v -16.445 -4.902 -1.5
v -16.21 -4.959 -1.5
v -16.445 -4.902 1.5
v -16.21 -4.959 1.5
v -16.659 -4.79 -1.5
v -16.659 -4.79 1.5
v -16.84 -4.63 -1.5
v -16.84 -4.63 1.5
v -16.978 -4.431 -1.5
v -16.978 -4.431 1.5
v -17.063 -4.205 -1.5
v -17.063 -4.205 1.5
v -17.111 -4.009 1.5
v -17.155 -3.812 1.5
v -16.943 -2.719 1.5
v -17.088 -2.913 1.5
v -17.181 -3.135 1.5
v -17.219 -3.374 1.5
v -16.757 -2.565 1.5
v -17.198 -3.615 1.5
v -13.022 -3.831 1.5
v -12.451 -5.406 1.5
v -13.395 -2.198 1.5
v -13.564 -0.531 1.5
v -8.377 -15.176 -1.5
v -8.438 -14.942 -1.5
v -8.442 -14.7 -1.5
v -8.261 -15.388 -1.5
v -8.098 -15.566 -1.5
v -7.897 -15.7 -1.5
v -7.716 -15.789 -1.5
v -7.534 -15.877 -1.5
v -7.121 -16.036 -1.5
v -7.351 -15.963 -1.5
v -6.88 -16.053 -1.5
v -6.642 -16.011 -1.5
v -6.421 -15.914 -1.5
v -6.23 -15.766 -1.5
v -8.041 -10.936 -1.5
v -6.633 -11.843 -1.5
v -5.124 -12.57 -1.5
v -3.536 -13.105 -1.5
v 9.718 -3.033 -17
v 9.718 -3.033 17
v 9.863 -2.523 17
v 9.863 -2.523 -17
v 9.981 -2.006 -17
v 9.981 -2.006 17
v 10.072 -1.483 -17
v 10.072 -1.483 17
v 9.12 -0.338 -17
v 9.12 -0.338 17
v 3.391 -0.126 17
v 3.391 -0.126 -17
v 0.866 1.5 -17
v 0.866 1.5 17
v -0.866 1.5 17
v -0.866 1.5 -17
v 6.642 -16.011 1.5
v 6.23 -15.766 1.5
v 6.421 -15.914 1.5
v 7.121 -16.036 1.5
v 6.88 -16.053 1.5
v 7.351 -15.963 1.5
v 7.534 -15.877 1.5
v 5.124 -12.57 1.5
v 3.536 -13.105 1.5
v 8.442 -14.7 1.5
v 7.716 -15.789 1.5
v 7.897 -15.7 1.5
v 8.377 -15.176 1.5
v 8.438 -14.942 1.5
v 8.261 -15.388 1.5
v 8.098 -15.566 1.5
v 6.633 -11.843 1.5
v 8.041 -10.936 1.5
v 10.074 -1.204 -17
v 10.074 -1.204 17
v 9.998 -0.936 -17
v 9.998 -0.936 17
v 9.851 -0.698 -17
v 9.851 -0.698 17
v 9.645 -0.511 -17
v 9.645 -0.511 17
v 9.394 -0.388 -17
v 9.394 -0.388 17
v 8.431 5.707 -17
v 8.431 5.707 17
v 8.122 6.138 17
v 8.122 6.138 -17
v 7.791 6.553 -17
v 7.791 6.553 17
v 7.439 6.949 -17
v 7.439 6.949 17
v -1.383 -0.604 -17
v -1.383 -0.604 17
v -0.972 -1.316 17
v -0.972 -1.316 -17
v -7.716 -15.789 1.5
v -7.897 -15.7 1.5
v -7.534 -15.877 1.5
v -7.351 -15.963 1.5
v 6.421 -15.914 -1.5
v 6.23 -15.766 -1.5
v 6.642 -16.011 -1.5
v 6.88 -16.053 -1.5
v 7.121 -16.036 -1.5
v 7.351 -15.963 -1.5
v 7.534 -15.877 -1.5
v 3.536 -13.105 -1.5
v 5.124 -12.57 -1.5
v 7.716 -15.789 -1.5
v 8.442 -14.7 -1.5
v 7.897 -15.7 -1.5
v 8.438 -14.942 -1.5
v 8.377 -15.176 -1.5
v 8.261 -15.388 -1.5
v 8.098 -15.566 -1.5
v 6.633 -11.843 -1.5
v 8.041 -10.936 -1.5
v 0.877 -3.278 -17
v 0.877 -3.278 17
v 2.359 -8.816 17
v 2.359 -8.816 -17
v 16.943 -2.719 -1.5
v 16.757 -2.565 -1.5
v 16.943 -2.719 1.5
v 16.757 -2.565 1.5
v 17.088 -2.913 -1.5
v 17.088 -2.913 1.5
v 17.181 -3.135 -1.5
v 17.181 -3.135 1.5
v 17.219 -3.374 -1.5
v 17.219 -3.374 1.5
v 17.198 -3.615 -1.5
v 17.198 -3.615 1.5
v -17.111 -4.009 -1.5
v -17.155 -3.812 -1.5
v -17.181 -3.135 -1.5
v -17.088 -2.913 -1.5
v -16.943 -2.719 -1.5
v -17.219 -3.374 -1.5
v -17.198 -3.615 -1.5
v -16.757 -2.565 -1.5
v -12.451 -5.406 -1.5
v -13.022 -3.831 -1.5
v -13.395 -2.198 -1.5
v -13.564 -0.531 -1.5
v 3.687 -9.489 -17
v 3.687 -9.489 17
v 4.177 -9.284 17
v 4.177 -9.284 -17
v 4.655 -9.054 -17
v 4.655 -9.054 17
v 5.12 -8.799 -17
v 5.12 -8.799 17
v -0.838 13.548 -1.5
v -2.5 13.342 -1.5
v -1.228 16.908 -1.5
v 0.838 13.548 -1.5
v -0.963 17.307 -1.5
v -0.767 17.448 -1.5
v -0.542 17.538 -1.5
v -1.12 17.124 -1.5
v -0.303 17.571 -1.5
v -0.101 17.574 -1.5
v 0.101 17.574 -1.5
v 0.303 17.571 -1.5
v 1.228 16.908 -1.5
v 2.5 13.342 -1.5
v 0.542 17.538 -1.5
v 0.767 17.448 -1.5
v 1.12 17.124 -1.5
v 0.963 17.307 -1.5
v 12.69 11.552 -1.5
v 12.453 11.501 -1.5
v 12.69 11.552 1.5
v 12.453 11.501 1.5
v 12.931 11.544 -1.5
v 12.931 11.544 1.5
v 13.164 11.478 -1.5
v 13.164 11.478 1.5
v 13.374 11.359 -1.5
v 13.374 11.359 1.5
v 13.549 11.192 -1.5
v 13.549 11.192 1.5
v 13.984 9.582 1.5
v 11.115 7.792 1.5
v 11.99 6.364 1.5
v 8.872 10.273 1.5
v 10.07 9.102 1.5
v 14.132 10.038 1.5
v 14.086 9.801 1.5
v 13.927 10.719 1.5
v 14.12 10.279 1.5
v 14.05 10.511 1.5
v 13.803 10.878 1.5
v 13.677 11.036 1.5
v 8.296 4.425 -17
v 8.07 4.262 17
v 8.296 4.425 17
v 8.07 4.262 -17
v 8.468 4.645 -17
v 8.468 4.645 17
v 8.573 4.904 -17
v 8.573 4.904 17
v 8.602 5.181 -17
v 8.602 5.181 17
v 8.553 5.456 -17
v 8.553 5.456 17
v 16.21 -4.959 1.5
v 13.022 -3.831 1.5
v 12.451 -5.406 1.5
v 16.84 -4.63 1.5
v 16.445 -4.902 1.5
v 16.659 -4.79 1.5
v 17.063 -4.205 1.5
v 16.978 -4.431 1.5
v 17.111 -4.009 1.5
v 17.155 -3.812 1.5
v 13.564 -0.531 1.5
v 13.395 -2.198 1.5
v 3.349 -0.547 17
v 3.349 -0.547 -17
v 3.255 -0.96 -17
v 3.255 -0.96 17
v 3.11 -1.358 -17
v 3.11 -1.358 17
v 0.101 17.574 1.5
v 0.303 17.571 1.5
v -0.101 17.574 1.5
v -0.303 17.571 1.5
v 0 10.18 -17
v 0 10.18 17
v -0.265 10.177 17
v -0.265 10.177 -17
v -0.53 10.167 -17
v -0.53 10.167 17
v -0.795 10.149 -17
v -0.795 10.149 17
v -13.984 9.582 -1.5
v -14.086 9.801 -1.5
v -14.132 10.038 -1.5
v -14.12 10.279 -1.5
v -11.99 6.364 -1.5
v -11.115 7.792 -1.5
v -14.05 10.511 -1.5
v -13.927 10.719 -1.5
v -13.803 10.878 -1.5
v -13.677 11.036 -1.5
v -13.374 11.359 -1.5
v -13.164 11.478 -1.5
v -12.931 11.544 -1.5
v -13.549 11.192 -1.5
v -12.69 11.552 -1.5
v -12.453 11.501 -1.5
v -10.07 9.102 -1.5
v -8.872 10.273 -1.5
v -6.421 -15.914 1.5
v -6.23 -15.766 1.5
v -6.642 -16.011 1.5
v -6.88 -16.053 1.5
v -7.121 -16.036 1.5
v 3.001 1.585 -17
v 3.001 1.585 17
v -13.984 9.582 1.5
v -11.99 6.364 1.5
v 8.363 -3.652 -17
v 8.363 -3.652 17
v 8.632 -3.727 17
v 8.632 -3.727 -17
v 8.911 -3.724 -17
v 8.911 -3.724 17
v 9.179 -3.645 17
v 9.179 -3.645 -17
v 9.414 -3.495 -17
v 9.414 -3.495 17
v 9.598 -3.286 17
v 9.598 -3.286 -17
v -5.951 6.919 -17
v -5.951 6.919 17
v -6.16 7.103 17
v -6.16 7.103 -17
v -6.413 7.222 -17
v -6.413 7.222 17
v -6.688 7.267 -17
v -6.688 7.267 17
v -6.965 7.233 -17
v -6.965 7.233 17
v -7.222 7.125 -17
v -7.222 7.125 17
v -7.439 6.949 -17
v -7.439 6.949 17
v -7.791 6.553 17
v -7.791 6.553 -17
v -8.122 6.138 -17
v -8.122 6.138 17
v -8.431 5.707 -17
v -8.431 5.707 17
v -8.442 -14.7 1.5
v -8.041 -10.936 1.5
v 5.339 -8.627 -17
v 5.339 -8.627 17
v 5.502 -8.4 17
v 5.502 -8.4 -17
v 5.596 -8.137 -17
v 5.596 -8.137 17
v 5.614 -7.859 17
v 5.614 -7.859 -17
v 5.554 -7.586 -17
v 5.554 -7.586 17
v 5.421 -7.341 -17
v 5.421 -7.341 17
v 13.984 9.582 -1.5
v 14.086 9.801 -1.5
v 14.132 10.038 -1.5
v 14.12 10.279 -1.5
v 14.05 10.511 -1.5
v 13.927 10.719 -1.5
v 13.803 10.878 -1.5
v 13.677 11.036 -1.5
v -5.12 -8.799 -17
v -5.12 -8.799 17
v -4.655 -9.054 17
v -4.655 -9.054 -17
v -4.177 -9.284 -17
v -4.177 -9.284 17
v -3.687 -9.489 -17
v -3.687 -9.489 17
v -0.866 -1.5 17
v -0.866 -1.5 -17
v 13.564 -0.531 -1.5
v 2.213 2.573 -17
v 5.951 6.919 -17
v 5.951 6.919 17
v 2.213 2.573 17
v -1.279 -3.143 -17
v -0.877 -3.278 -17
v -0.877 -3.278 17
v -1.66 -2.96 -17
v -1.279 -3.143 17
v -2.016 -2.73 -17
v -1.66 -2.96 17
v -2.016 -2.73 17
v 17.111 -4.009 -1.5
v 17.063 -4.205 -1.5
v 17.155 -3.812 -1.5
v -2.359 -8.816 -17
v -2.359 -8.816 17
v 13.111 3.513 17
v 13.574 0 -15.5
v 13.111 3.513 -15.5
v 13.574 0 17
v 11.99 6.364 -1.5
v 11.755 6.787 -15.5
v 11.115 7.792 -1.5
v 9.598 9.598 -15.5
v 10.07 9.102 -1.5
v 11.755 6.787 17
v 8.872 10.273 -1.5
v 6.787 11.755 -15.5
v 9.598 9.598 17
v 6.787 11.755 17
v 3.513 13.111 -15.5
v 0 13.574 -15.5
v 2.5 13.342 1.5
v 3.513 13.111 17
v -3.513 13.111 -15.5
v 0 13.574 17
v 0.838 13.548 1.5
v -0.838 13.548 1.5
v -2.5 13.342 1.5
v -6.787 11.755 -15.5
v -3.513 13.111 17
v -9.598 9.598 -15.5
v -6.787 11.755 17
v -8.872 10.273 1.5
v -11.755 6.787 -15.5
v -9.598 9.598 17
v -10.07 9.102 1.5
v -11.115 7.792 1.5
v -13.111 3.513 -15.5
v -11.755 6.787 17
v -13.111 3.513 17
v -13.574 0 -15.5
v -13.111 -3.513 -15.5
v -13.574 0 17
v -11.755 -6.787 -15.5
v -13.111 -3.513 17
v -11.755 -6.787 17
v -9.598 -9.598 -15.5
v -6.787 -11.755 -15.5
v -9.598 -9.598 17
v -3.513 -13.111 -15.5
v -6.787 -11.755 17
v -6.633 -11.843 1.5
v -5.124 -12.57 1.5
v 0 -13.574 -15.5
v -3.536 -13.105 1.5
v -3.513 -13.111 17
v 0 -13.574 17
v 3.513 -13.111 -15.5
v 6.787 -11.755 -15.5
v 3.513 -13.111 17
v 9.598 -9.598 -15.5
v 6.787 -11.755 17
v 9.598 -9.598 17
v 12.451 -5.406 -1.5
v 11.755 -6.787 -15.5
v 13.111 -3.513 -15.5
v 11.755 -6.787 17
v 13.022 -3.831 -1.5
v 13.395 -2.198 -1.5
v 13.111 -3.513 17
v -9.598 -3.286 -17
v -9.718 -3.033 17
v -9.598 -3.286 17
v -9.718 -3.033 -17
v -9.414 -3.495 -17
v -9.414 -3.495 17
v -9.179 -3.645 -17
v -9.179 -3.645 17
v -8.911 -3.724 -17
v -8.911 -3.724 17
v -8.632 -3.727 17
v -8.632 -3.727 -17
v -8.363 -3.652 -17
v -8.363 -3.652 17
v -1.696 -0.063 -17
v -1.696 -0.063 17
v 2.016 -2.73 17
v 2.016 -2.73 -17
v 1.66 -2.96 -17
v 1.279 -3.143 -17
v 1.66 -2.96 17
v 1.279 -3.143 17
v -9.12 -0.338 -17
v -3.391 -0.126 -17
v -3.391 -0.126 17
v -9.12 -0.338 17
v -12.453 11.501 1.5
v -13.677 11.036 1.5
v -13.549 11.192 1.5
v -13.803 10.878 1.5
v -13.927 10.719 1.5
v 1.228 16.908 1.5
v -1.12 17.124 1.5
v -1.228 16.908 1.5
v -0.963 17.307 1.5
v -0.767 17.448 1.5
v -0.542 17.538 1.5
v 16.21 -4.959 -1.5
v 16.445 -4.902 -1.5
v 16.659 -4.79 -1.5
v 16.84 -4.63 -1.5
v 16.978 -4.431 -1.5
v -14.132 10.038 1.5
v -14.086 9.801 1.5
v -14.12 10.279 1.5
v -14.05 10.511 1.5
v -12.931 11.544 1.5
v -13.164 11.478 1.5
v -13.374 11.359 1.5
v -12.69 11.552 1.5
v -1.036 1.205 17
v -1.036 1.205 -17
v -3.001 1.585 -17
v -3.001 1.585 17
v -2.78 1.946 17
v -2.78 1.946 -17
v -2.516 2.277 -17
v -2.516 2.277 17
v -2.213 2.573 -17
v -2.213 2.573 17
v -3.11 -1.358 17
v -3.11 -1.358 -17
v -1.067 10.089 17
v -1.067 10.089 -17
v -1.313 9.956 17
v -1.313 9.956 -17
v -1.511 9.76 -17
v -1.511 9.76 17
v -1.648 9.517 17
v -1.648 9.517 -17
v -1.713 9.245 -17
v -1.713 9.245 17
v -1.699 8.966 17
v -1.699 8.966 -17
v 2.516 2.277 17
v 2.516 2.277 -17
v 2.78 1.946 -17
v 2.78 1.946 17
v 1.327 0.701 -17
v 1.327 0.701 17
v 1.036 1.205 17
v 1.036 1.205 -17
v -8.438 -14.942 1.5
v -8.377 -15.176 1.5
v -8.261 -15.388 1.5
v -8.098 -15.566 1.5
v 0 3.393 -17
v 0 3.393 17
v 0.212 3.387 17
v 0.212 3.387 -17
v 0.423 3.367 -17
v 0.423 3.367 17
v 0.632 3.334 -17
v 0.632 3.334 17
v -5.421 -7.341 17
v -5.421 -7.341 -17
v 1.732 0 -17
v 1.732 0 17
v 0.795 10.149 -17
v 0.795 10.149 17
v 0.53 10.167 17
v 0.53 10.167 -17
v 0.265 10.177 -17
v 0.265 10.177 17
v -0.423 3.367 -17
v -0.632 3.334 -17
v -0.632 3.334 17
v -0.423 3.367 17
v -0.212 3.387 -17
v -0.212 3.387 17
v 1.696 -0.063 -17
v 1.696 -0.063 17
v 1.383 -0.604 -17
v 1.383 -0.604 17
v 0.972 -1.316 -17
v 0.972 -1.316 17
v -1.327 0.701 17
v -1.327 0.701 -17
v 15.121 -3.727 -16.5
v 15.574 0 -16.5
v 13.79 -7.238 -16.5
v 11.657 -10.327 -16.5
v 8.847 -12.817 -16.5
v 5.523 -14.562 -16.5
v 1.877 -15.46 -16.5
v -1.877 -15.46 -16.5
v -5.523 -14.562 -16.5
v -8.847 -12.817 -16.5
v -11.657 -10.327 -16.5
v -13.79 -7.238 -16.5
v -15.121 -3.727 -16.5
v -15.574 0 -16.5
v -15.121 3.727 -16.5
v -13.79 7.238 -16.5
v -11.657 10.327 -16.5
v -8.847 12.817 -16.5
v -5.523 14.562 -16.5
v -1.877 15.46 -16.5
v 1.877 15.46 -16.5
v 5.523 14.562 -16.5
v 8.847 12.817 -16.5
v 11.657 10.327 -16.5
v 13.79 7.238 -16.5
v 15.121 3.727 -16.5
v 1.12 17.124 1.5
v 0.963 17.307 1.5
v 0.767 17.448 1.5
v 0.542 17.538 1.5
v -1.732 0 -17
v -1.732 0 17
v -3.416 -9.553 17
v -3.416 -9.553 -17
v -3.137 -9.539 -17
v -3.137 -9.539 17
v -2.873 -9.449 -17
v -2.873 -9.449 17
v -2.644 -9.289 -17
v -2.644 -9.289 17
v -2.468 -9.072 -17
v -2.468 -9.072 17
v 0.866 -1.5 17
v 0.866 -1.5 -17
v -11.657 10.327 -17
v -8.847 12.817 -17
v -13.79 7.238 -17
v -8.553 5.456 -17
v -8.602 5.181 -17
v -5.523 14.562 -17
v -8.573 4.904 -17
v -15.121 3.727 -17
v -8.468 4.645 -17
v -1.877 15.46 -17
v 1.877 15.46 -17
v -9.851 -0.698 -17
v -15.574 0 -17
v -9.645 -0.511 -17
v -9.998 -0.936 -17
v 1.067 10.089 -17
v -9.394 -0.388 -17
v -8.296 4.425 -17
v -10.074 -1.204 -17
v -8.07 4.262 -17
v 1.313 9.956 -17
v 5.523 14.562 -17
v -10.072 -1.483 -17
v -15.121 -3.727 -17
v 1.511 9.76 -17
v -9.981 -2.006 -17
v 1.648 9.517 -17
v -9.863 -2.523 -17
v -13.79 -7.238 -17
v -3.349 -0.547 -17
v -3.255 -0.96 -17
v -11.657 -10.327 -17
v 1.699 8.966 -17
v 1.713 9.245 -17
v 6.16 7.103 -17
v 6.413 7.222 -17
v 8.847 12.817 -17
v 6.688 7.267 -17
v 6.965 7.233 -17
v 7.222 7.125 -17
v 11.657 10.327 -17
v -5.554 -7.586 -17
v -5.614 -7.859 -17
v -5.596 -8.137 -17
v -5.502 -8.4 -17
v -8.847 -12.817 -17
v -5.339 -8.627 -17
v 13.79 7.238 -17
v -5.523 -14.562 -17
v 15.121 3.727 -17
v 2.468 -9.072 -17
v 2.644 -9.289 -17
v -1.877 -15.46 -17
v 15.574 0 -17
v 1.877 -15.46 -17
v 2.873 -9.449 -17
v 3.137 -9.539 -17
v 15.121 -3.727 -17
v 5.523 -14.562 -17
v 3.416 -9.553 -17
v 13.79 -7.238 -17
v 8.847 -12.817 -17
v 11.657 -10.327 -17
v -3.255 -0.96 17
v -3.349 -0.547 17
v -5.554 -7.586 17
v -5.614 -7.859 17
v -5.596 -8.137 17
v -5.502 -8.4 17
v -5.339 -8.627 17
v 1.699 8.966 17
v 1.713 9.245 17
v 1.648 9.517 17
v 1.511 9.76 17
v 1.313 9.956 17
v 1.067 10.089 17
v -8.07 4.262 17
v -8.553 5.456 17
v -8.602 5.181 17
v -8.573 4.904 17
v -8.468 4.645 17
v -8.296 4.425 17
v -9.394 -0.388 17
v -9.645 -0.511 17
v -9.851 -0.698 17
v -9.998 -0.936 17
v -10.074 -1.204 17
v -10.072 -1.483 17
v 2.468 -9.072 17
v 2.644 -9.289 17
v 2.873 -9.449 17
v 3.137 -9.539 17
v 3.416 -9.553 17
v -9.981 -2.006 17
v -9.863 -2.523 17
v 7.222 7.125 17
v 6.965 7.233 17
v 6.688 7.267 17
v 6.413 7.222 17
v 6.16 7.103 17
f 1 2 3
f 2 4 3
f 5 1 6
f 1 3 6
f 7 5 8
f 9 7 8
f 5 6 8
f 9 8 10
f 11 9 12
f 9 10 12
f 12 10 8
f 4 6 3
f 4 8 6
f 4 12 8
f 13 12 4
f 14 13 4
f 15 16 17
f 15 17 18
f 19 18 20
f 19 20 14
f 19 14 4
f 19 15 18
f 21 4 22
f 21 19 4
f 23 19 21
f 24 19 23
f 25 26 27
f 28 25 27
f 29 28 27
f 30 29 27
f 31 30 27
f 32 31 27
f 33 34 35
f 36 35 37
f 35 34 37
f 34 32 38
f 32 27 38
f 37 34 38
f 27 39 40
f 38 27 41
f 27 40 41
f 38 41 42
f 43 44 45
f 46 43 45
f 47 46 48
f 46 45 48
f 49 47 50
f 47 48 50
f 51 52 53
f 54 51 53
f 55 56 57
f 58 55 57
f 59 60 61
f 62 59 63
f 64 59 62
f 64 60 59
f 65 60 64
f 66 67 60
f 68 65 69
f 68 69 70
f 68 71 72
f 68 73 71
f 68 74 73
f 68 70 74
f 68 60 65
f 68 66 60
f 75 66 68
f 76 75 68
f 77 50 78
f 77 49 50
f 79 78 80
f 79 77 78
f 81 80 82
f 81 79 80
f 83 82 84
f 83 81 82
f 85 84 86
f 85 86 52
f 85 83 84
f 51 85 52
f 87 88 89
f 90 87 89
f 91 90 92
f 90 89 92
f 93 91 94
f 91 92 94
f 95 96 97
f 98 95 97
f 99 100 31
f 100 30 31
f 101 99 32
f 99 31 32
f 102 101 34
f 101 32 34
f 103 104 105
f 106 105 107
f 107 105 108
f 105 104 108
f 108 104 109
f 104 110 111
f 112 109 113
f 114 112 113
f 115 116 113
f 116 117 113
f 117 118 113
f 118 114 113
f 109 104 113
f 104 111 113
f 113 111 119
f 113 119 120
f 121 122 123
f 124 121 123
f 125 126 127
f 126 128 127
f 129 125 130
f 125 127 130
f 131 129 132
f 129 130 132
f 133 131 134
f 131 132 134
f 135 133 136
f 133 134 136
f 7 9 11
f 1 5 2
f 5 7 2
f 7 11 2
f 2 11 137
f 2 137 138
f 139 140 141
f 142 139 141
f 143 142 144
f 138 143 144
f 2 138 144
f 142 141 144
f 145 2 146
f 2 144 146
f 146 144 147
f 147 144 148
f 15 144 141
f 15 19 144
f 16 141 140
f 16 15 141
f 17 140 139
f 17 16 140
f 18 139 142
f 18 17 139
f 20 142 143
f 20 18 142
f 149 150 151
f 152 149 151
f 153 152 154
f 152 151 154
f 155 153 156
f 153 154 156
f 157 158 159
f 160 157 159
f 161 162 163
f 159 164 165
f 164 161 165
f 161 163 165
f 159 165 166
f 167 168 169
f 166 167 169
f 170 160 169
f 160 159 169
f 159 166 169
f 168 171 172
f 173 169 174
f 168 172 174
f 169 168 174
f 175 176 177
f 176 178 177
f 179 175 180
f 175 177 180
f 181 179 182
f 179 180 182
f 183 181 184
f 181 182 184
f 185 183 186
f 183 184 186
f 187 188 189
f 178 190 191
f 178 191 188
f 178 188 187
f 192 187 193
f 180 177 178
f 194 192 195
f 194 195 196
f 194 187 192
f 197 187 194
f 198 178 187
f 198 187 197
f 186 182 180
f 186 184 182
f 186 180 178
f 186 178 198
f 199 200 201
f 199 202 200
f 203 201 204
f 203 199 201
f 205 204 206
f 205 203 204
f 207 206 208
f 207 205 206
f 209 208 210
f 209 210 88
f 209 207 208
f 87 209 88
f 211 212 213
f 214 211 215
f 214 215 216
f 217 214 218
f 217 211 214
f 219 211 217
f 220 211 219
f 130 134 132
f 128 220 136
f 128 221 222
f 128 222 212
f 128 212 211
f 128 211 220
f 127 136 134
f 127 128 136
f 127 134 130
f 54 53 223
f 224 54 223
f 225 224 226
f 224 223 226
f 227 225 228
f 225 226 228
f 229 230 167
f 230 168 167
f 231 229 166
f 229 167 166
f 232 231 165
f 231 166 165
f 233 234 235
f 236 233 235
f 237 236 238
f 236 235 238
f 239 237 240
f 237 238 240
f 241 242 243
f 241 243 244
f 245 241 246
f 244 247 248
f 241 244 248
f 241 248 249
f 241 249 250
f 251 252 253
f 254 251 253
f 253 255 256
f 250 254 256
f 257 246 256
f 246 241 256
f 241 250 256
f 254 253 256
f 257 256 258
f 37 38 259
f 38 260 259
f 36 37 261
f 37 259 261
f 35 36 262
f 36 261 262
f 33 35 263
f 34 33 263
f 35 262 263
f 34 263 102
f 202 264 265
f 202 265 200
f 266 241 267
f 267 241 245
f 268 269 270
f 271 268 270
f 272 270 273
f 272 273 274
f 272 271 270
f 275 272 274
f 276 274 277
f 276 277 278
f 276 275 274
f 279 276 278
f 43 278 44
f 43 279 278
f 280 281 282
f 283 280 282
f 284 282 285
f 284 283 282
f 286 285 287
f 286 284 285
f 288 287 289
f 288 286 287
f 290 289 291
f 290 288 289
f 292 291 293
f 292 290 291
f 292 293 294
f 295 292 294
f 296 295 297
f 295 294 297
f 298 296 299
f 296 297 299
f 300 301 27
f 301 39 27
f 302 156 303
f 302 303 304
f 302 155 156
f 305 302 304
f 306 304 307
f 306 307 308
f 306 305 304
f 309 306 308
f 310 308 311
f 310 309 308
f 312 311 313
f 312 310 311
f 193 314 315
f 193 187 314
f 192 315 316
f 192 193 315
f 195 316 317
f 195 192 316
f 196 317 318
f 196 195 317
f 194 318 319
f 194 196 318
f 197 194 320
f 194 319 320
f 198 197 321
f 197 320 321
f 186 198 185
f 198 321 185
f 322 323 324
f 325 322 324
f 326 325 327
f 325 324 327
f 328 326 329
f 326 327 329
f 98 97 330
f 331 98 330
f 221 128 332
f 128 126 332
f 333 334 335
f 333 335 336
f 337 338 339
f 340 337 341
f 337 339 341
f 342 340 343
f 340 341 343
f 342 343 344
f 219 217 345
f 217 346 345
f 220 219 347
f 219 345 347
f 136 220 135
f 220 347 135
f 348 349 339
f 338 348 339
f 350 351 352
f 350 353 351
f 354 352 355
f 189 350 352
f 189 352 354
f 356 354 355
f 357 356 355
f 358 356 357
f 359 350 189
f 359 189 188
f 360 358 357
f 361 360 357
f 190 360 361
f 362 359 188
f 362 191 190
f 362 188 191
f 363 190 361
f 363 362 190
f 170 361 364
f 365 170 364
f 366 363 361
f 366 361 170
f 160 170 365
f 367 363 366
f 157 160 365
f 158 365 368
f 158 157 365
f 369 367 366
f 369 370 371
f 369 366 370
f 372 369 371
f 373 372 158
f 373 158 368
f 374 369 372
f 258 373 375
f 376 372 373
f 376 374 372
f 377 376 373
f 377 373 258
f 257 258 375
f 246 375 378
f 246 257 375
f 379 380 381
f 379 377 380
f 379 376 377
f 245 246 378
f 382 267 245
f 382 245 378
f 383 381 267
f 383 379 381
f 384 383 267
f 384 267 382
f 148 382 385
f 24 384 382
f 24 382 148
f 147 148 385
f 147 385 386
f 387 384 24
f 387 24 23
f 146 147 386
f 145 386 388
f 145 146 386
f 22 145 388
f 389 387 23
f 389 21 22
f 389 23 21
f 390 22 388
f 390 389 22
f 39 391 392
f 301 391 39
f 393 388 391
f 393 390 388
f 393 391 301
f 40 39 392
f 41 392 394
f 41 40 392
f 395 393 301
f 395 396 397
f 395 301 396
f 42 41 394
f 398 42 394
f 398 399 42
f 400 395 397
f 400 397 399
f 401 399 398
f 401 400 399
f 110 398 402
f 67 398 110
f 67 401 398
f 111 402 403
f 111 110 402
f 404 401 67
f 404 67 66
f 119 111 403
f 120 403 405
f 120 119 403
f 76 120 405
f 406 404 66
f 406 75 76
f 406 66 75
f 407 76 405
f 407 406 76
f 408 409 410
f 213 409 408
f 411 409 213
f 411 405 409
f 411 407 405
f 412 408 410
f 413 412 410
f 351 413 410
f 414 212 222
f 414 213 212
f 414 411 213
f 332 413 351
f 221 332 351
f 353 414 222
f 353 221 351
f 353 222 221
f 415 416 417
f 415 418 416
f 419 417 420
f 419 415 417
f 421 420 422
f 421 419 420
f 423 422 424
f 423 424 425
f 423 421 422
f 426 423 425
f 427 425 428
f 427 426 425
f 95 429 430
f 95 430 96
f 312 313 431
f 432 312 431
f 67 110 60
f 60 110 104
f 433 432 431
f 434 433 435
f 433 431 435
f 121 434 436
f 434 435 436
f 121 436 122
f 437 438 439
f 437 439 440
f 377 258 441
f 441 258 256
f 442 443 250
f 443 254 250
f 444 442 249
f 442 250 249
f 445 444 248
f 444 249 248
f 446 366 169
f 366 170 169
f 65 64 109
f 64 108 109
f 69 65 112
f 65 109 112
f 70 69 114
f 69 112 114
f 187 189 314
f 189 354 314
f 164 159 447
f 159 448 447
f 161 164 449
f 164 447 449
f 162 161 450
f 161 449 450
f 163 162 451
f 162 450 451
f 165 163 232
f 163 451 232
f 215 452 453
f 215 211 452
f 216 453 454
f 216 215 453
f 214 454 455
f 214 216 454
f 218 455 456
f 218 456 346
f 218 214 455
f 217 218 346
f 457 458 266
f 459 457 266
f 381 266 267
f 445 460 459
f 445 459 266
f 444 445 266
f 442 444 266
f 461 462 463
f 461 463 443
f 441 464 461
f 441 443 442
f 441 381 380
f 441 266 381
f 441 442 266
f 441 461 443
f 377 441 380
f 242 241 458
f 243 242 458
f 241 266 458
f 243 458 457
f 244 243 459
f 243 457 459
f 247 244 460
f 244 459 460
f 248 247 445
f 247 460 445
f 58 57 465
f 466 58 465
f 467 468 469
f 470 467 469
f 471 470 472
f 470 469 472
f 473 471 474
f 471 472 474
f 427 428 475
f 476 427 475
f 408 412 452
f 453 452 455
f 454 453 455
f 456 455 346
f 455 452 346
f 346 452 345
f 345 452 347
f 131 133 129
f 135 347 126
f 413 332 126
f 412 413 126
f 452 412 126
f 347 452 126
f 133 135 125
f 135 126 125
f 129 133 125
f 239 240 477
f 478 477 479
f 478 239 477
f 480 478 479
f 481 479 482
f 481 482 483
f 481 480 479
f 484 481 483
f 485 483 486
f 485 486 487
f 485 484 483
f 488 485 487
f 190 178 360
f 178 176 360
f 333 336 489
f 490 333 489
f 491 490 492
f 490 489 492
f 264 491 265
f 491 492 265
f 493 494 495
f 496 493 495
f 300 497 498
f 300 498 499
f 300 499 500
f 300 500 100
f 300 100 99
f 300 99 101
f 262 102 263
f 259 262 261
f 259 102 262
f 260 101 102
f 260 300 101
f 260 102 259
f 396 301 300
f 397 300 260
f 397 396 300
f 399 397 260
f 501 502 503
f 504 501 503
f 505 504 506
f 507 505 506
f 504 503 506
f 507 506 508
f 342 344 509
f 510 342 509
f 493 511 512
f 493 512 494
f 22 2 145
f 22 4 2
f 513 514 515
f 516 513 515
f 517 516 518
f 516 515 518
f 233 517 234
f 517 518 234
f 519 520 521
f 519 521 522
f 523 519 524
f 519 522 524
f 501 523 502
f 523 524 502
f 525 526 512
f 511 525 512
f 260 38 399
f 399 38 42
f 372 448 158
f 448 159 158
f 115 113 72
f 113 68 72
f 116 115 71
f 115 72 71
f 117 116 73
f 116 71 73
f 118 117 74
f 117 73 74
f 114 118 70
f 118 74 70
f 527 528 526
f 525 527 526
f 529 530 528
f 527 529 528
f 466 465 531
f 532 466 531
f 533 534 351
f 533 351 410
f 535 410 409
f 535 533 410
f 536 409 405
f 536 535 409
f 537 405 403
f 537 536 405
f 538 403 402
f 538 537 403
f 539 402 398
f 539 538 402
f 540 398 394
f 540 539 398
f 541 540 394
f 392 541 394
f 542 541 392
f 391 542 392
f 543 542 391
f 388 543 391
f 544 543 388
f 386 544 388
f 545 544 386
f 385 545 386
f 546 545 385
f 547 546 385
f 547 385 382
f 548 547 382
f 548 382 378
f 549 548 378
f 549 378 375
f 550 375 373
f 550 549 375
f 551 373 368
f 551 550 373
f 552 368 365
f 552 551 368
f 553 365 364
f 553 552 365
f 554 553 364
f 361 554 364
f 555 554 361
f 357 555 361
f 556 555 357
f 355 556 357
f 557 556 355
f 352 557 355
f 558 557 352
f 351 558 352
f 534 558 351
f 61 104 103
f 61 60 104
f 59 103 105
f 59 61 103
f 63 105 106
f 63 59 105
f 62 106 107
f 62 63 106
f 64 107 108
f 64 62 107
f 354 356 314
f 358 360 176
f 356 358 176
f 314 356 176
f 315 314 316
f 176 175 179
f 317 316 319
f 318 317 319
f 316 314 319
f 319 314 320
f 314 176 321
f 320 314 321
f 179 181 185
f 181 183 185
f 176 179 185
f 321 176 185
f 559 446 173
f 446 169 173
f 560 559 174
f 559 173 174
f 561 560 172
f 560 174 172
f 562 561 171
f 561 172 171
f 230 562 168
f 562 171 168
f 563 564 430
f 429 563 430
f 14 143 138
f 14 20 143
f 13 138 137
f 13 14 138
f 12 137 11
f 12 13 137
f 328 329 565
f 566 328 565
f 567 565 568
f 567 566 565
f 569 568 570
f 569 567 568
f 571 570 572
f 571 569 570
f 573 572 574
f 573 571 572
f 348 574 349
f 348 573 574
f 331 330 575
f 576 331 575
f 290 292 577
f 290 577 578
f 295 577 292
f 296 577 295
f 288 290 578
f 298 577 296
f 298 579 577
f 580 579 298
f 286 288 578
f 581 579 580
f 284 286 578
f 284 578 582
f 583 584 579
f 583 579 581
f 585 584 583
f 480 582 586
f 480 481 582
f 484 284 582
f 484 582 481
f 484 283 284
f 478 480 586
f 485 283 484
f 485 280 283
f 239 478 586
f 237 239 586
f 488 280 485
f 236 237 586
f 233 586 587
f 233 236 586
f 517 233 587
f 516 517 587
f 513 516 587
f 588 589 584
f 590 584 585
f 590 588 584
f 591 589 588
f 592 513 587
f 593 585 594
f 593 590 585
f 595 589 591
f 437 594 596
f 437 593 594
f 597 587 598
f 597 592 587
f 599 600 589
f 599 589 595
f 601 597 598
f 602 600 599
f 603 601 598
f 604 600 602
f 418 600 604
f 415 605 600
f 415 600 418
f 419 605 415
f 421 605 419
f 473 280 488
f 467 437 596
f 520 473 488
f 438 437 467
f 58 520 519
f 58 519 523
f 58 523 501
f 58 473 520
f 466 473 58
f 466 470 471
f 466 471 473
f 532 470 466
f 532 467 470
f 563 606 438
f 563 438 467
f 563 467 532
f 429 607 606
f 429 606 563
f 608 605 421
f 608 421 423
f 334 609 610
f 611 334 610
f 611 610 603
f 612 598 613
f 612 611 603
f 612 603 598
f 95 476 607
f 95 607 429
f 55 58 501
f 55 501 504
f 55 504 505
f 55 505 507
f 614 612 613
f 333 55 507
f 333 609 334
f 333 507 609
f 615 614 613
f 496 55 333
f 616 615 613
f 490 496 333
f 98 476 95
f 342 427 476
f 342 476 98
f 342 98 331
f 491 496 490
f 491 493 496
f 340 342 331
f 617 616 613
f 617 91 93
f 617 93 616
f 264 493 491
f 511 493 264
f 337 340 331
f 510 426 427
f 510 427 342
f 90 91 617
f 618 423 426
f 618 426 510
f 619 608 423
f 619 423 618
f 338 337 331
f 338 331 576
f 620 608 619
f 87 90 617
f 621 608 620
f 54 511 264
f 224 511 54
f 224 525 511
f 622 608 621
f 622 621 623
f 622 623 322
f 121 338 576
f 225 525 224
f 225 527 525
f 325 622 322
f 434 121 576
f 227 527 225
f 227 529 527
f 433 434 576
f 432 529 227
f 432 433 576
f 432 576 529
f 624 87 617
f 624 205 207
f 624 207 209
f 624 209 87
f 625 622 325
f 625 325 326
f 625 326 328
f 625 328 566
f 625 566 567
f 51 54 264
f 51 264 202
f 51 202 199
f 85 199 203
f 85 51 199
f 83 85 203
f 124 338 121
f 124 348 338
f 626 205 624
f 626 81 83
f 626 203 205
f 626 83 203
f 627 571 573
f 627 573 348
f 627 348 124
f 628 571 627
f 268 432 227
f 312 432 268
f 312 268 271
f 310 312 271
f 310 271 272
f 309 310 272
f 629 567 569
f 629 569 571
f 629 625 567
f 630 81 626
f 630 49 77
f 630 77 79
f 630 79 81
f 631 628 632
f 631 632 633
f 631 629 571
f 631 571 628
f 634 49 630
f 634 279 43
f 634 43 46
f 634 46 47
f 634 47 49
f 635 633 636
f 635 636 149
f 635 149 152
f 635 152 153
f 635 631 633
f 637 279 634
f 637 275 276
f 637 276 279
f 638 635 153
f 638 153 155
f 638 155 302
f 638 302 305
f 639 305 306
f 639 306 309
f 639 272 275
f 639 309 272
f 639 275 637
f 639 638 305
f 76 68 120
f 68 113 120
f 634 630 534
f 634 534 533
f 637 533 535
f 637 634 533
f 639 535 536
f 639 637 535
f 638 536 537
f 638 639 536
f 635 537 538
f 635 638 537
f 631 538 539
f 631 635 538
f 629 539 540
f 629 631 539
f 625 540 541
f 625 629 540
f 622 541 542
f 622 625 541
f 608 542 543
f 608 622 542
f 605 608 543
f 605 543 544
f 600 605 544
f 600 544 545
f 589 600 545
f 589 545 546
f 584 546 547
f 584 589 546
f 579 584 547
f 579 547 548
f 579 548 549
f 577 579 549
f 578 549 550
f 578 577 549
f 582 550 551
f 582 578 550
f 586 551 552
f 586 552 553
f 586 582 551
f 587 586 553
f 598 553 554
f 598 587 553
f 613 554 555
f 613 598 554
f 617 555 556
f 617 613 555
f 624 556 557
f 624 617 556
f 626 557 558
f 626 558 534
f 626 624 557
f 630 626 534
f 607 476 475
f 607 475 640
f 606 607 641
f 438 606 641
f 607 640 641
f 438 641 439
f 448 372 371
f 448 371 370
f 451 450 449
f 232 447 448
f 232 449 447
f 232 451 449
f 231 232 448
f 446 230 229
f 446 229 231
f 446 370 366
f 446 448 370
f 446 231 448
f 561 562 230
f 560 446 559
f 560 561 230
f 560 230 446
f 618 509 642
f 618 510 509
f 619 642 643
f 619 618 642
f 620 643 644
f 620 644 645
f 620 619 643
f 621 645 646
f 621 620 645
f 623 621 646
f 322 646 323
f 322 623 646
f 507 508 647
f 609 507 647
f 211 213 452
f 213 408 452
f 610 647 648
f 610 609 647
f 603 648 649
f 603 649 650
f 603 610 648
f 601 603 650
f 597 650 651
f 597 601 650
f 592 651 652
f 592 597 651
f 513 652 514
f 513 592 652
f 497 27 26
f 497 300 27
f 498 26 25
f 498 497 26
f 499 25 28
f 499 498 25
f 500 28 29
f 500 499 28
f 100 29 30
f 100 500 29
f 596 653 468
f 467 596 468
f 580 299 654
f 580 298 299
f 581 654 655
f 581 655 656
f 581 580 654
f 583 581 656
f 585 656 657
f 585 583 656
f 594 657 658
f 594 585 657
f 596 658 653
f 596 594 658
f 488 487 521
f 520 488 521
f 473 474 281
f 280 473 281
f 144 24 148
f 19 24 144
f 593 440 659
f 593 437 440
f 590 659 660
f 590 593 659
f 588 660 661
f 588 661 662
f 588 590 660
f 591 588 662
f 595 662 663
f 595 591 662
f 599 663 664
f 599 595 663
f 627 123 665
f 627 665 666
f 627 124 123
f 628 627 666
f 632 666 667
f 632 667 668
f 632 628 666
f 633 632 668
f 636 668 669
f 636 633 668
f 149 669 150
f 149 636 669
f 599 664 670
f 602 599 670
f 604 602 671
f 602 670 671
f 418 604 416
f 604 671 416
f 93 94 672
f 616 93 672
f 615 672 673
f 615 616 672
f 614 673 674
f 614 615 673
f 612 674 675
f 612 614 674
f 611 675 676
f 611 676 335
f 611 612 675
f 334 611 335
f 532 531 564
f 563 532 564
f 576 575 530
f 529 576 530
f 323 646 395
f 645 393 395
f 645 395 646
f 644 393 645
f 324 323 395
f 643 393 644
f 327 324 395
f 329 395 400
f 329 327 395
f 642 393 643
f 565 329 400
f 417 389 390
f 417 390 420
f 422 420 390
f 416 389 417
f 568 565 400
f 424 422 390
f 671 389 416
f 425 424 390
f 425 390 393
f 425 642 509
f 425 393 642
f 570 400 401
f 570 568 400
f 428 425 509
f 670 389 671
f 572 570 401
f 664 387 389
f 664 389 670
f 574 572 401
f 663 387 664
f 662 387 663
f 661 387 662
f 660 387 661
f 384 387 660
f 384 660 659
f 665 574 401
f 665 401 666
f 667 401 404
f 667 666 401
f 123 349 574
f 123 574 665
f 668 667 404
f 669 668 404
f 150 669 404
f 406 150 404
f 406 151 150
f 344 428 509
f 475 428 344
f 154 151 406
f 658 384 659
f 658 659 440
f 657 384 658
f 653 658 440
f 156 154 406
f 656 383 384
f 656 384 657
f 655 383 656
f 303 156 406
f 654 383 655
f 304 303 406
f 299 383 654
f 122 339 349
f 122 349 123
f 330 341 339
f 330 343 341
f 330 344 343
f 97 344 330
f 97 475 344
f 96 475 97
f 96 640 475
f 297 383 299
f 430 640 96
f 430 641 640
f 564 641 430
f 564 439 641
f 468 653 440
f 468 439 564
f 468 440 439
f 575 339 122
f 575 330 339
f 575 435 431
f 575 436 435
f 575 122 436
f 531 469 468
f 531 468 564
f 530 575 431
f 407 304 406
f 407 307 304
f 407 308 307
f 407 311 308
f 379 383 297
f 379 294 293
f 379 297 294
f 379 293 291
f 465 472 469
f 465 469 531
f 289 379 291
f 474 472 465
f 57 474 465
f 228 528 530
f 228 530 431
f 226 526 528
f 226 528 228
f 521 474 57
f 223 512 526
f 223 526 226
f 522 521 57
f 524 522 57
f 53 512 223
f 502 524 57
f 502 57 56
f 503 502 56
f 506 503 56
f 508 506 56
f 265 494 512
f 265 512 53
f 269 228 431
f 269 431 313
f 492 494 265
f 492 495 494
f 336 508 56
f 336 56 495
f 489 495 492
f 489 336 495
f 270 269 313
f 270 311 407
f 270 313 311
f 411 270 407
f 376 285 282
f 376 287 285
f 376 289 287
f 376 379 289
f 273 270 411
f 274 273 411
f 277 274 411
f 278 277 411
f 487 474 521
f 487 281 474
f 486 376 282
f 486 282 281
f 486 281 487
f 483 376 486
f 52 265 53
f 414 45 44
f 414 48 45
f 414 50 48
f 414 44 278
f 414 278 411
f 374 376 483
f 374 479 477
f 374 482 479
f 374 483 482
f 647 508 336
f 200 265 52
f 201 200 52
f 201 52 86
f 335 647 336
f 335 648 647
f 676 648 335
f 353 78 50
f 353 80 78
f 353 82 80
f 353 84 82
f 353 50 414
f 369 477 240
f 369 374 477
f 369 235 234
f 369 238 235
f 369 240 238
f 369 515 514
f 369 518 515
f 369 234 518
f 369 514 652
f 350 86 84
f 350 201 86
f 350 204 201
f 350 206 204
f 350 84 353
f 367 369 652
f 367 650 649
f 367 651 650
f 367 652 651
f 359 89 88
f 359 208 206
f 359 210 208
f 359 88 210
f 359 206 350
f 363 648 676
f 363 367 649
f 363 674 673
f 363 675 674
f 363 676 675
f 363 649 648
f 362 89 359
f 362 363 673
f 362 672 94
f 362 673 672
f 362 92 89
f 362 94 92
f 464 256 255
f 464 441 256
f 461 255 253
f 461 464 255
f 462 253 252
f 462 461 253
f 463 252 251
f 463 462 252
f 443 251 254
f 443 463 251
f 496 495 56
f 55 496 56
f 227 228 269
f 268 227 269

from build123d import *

# Parameters (mm, degrees)
F0_R     = 13.57391
F1_DEPTH = 17
F3_DEPTH = 1.5
F5_DEPTH = 34
F6_R     = 1
F7_R     = 15.57391
F7_R_2   = 13.57391
F8_DEPTH = 1.5
F9_SIZE2 = 0.99999
F9_SIZE  = 1.99999
F10_R    = 1


# Not quite as in the source:
# - a fillet or chamfer is up to 0.001 mm smaller than in the source, because OpenCascade refuses the exact size
# - a feature names something its author has since deleted; it is built from what else it names


with BuildPart() as f1:
    # F0 (on Top) → F1 (new body, symmetric)
    with BuildSketch(Plane.XY):
        Circle(F0_R)
    extrude(amount=F1_DEPTH, both=True)

    # F2 (on Top) → F3 (join, symmetric)
    with BuildSketch(Plane.XY):
        with BuildLine():
            Line((-8.8722387473, 10.27299432), (-13.094084175, 11.721231689))
            ThreePointArc((-13.094084175, 11.721231689), (-13.7398361081, 10.9571536638), (-14.3410637787, 10.1575687241))
            Line((-14.3410637787, 10.1575687241), (-11.9896877566, 6.3638369077))
            ThreePointArc((-11.9896877566, 6.3638369077), (-10.6125101782, 8.4631944563), (-8.8722387473, 10.27299432))
        make_face()
        with BuildLine():
            ThreePointArc((1, 17.5454356654), (0, 17.57391), (-1, 17.5454356654))
            Line((-1, 17.5454356654), (-2.5, 13.3417027657))
            ThreePointArc((-2.5, 13.3417027657), (0, 13.57391), (2.5, 13.3417027657))
            Line((2.5, 13.3417027657), (1, 17.5454356654))
        make_face()
        with BuildLine():
            Line((11.9896877566, 6.3638369077), (14.3410637787, 10.1575687241))
            ThreePointArc((14.3410637787, 10.1575687241), (13.7398361081, 10.9571536638), (13.094084175, 11.721231689))
            Line((13.094084175, 11.721231689), (8.8722387473, 10.27299432))
            ThreePointArc((8.8722387473, 10.27299432), (10.6125101782, 8.4631944563), (11.9896877566, 6.3638369077))
        make_face()
        with BuildLine():
            Line((12.4508960874, -5.4061279404), (16.8830140276, -4.8791546431))
            ThreePointArc((16.8830140276, -4.8791546431), (17.1332953852, -3.9105628665), (17.3280558955, -2.9292988187))
            Line((17.3280558955, -2.9292988187), (13.5635007572, -0.5314883795))
            ThreePointArc((13.5635007572, -0.5314883795), (13.2335837364, -3.0204791306), (12.4508960874, -5.4061279404))
        make_face()
        with BuildLine():
            Line((3.5363257124, -13.1051681845), (6.711710363, -16.2417750474))
            ThreePointArc((6.711710363, -16.2417750474), (7.6250337817, -15.8335457973), (8.5136480988, -15.3740075692))
            Line((8.5136480988, -15.3740075692), (8.0411700519, -10.9357494889))
            ThreePointArc((8.0411700519, -10.9357494889), (5.8894988252, -12.2296703257), (3.5363257124, -13.1051681845))
        make_face()
        with BuildLine():
            Line((-8.0411700519, -10.9357494889), (-8.5136480988, -15.3740075692))
            ThreePointArc((-8.5136480988, -15.3740075692), (-7.6250337817, -15.8335457973), (-6.711710363, -16.2417750474))
            Line((-6.711710363, -16.2417750474), (-3.5363257124, -13.1051681845))
            ThreePointArc((-3.5363257124, -13.1051681845), (-5.8894988252, -12.2296703257), (-8.0411700519, -10.9357494889))
        make_face()
        with BuildLine():
            Line((-13.5635007572, -0.5314883795), (-17.3280558955, -2.9292988187))
            ThreePointArc((-17.3280558955, -2.9292988187), (-17.1332953852, -3.9105628665), (-16.8830140276, -4.8791546431))
            Line((-16.8830140276, -4.8791546431), (-12.4508960874, -5.4061279404))
            ThreePointArc((-12.4508960874, -5.4061279404), (-13.2335837364, -3.0204791306), (-13.5635007572, -0.5314883795))
        make_face()
    extrude(amount=F3_DEPTH, both=True)

    # F4 (on face) → F5 (cut)
    with BuildSketch(Plane.XY.offset(17)):
        with BuildLine():
            ThreePointArc((-3.0007085232, 1.5847516846), (-2.6531275445, 2.1157986141), (-2.2127391143, 2.5728340707))
            Line((-2.2127391143, 2.5728340707), (-6.6382173429, 7.718502212))
            ThreePointArc((-6.6382173429, 7.718502212), (-7.9593826336, 6.3473958423), (-9.0021255696, 4.7542550537))
            Line((-9.0021255696, 4.7542550537), (-3.0007085232, 1.5847516846))
        make_face()
        with BuildLine():
            ThreePointArc((-0.6319024037, 3.334124907), (-0.3173418417, 3.3786067688), (0, 3.3934775))
            Line((0, 3.3934775), (0, 6.786955))
            Line((0, 6.786955), (0, 10.1804325))
            ThreePointArc((0, 10.1804325), (-0.9520255252, 10.1358203065), (-1.895707211, 10.0023747209))
            Line((-1.895707211, 10.0023747209), (-0.6319024037, 3.334124907))
        make_face()
        with BuildLine():
            Line((0, 6.786955), (0, 3.3934775))
            ThreePointArc((0, 3.3934775), (0.3173418417, 3.3786067688), (0.6319024037, 3.334124907))
            Line((0.6319024037, 3.334124907), (1.895707211, 10.0023747209))
            ThreePointArc((1.895707211, 10.0023747209), (0.9520255252, 10.1358203065), (0, 10.1804325))
            Line((0, 10.1804325), (0, 6.786955))
        make_face()
        with BuildLine():
            ThreePointArc((2.2127391143, 2.5728340707), (2.6531275445, 2.1157986141), (3.0007085232, 1.5847516846))
            Line((3.0007085232, 1.5847516846), (9.0021255696, 4.7542550537))
            ThreePointArc((9.0021255696, 4.7542550537), (7.9593826336, 6.3473958423), (6.6382173429, 7.718502212))
            Line((6.6382173429, 7.718502212), (2.2127391143, 2.5728340707))
        make_face()
        with BuildLine():
            ThreePointArc((3.3911429475, -0.1258532971), (3.3083959341, -0.7551197827), (3.1099199215, -1.3579718793))
            Line((3.1099199215, -1.3579718793), (9.3297597644, -4.073915638))
            ThreePointArc((9.3297597644, -4.073915638), (9.9251878023, -2.265359348), (10.1734288426, -0.3775598913))
            Line((10.1734288426, -0.3775598913), (3.3911429475, -0.1258532971))
        make_face()
        with BuildLine():
            ThreePointArc((2.0159469746, -2.7297705652), (1.4723747063, -3.0574175814), (0.8772981881, -3.2781149205))
            Line((0.8772981881, -3.2781149205), (2.6318945642, -9.8343447616))
            ThreePointArc((2.6318945642, -9.8343447616), (4.4171241189, -9.1722527443), (6.0478409237, -8.1893116956))
            Line((6.0478409237, -8.1893116956), (2.0159469746, -2.7297705652))
        make_face()
        with BuildLine():
            ThreePointArc((-0.8772981881, -3.2781149205), (-1.4723747063, -3.0574175814), (-2.0159469746, -2.7297705652))
            Line((-2.0159469746, -2.7297705652), (-6.0478409237, -8.1893116956))
            ThreePointArc((-6.0478409237, -8.1893116956), (-4.4171241189, -9.1722527443), (-2.6318945642, -9.8343447616))
            Line((-2.6318945642, -9.8343447616), (-0.8772981881, -3.2781149205))
        make_face()
        with BuildLine():
            ThreePointArc((-3.1099199215, -1.3579718793), (-3.3083959341, -0.7551197827), (-3.3911429475, -0.1258532971))
            Line((-3.3911429475, -0.1258532971), (-10.1734288426, -0.3775598913))
            ThreePointArc((-10.1734288426, -0.3775598913), (-9.9251878023, -2.265359348), (-9.3297597644, -4.073915638))
            Line((-9.3297597644, -4.073915638), (-3.1099199215, -1.3579718793))
        make_face()
        Polygon((1.3273298856, 0.7009971998), (0, 0), (1.6957169725, -0.0629320484), (1.7320508076, 0), align=None)
        Polygon((1.6957169725, -0.0629320484), (0, 0), (1.3833114811, -0.6040342321), align=None)
        Polygon((1.3833114811, -0.6040342321), (0, 0), (0.9720883359, -1.3162936127), align=None)
        Polygon((0.9720883359, -1.3162936127), (0, 0), (0.4014341516, -1.5), (0.8660254038, -1.5), align=None)
        Polygon((0.4014341516, -1.5), (0, 0), (-0.4014341516, -1.5), align=None)
        Polygon((-0.4014341516, -1.5), (0, 0), (-0.9720883359, -1.3162936127), (-0.8660254038, -1.5), align=None)
        Polygon((-0.9720883359, -1.3162936127), (0, 0), (-1.3833114811, -0.6040342321), align=None)
        Polygon((-1.3833114811, -0.6040342321), (0, 0), (-1.6957169725, -0.0629320484), align=None)
        Polygon((-1.6957169725, -0.0629320484), (0, 0), (-1.3273298856, 0.7009971998), (-1.7320508076, 0), align=None)
        Polygon((-1.3273298856, 0.7009971998), (0, 0), (-1.0363453205, 1.2049972508), align=None)
        Polygon((-1.0363453205, 1.2049972508), (0, 0), (-0.2842885711, 1.5), (-0.8660254038, 1.5), align=None)
        Polygon((-0.2842885711, 1.5), (0, 0), (0, 1.5), align=None)
        Polygon((0, 1.5), (0, 0), (0.2842885711, 1.5), align=None)
        Polygon((0.2842885711, 1.5), (0, 0), (1.0363453205, 1.2049972508), (0.8660254038, 1.5), align=None)
        Polygon((1.0363453205, 1.2049972508), (0, 0), (1.3273298856, 0.7009971998), align=None)
    extrude(amount=-F5_DEPTH, mode=Mode.SUBTRACT)

    # F6
    f6_edges = [f1.edges().sort_by_distance(p)[0] for p in [
        (-6.047841, -8.189312, 0),
        (-2.631895, -9.834345, 0),
        (2.631895, -9.834345, 0),
        (6.047841, -8.189312, 0),
        (9.32976, -4.073916, 0),
        (-9.32976, -4.073916, 0),
        (-10.173429, -0.37756, 0),
        (-9.002126, 4.754255, 0),
        (-6.638217, 7.718502, 0),
        (6.638217, 7.718502, 0),
        (-1.895707, 10.002375, 0),
        (1.895707, 10.002375, 0),
        (9.002126, 4.754255, 0),
        (10.173429, -0.37756, 0),
    ]]
    fillet(f6_edges, radius=F6_R)

    # F7 (on face) → F8 (join)
    with BuildSketch(Plane(origin=(0, 0, -17), x_dir=(1, 0, 0), z_dir=(0, 0, -1))):
        Circle(F7_R)
        Circle(F7_R_2, mode=Mode.SUBTRACT)
    extrude(amount=-F8_DEPTH)

    # F9 (size 2 and 1 in the source; OpenCascade refuses exactly that, so slightly less here)
    f9_edges = [f1.edges().sort_by_distance(p)[0] for p in [
        (-15.57391, 0, -15.5),
    ]]
    f9_side = f1.faces().sort_by_distance((-15.133413, 0, -15.5))[0]
    chamfer(f9_edges, length=F9_SIZE, length2=F9_SIZE2, reference=f9_side)

    # F10
    f10_edges = [f1.edges().sort_by_distance(p)[0] for p in [
        (14.341064, 10.157569, 0),
        (13.094084, 11.721232, 0),
        (1, 17.545436, 0),
        (-1, 17.545436, 0),
        (-13.094084, 11.721232, 0),
        (-14.341064, 10.157569, 0),
        (-17.328056, -2.929299, 0),
        (-16.883014, -4.879155, 0),
        (-8.513648, -15.374008, 0),
        (-6.71171, -16.241775, 0),
        (6.71171, -16.241775, 0),
        (8.513648, -15.374008, 0),
        (16.883014, -4.879155, 0),
        (17.328056, -2.929299, 0),
    ]]
    fillet(f10_edges, radius=F10_R)


solid = f1.part
